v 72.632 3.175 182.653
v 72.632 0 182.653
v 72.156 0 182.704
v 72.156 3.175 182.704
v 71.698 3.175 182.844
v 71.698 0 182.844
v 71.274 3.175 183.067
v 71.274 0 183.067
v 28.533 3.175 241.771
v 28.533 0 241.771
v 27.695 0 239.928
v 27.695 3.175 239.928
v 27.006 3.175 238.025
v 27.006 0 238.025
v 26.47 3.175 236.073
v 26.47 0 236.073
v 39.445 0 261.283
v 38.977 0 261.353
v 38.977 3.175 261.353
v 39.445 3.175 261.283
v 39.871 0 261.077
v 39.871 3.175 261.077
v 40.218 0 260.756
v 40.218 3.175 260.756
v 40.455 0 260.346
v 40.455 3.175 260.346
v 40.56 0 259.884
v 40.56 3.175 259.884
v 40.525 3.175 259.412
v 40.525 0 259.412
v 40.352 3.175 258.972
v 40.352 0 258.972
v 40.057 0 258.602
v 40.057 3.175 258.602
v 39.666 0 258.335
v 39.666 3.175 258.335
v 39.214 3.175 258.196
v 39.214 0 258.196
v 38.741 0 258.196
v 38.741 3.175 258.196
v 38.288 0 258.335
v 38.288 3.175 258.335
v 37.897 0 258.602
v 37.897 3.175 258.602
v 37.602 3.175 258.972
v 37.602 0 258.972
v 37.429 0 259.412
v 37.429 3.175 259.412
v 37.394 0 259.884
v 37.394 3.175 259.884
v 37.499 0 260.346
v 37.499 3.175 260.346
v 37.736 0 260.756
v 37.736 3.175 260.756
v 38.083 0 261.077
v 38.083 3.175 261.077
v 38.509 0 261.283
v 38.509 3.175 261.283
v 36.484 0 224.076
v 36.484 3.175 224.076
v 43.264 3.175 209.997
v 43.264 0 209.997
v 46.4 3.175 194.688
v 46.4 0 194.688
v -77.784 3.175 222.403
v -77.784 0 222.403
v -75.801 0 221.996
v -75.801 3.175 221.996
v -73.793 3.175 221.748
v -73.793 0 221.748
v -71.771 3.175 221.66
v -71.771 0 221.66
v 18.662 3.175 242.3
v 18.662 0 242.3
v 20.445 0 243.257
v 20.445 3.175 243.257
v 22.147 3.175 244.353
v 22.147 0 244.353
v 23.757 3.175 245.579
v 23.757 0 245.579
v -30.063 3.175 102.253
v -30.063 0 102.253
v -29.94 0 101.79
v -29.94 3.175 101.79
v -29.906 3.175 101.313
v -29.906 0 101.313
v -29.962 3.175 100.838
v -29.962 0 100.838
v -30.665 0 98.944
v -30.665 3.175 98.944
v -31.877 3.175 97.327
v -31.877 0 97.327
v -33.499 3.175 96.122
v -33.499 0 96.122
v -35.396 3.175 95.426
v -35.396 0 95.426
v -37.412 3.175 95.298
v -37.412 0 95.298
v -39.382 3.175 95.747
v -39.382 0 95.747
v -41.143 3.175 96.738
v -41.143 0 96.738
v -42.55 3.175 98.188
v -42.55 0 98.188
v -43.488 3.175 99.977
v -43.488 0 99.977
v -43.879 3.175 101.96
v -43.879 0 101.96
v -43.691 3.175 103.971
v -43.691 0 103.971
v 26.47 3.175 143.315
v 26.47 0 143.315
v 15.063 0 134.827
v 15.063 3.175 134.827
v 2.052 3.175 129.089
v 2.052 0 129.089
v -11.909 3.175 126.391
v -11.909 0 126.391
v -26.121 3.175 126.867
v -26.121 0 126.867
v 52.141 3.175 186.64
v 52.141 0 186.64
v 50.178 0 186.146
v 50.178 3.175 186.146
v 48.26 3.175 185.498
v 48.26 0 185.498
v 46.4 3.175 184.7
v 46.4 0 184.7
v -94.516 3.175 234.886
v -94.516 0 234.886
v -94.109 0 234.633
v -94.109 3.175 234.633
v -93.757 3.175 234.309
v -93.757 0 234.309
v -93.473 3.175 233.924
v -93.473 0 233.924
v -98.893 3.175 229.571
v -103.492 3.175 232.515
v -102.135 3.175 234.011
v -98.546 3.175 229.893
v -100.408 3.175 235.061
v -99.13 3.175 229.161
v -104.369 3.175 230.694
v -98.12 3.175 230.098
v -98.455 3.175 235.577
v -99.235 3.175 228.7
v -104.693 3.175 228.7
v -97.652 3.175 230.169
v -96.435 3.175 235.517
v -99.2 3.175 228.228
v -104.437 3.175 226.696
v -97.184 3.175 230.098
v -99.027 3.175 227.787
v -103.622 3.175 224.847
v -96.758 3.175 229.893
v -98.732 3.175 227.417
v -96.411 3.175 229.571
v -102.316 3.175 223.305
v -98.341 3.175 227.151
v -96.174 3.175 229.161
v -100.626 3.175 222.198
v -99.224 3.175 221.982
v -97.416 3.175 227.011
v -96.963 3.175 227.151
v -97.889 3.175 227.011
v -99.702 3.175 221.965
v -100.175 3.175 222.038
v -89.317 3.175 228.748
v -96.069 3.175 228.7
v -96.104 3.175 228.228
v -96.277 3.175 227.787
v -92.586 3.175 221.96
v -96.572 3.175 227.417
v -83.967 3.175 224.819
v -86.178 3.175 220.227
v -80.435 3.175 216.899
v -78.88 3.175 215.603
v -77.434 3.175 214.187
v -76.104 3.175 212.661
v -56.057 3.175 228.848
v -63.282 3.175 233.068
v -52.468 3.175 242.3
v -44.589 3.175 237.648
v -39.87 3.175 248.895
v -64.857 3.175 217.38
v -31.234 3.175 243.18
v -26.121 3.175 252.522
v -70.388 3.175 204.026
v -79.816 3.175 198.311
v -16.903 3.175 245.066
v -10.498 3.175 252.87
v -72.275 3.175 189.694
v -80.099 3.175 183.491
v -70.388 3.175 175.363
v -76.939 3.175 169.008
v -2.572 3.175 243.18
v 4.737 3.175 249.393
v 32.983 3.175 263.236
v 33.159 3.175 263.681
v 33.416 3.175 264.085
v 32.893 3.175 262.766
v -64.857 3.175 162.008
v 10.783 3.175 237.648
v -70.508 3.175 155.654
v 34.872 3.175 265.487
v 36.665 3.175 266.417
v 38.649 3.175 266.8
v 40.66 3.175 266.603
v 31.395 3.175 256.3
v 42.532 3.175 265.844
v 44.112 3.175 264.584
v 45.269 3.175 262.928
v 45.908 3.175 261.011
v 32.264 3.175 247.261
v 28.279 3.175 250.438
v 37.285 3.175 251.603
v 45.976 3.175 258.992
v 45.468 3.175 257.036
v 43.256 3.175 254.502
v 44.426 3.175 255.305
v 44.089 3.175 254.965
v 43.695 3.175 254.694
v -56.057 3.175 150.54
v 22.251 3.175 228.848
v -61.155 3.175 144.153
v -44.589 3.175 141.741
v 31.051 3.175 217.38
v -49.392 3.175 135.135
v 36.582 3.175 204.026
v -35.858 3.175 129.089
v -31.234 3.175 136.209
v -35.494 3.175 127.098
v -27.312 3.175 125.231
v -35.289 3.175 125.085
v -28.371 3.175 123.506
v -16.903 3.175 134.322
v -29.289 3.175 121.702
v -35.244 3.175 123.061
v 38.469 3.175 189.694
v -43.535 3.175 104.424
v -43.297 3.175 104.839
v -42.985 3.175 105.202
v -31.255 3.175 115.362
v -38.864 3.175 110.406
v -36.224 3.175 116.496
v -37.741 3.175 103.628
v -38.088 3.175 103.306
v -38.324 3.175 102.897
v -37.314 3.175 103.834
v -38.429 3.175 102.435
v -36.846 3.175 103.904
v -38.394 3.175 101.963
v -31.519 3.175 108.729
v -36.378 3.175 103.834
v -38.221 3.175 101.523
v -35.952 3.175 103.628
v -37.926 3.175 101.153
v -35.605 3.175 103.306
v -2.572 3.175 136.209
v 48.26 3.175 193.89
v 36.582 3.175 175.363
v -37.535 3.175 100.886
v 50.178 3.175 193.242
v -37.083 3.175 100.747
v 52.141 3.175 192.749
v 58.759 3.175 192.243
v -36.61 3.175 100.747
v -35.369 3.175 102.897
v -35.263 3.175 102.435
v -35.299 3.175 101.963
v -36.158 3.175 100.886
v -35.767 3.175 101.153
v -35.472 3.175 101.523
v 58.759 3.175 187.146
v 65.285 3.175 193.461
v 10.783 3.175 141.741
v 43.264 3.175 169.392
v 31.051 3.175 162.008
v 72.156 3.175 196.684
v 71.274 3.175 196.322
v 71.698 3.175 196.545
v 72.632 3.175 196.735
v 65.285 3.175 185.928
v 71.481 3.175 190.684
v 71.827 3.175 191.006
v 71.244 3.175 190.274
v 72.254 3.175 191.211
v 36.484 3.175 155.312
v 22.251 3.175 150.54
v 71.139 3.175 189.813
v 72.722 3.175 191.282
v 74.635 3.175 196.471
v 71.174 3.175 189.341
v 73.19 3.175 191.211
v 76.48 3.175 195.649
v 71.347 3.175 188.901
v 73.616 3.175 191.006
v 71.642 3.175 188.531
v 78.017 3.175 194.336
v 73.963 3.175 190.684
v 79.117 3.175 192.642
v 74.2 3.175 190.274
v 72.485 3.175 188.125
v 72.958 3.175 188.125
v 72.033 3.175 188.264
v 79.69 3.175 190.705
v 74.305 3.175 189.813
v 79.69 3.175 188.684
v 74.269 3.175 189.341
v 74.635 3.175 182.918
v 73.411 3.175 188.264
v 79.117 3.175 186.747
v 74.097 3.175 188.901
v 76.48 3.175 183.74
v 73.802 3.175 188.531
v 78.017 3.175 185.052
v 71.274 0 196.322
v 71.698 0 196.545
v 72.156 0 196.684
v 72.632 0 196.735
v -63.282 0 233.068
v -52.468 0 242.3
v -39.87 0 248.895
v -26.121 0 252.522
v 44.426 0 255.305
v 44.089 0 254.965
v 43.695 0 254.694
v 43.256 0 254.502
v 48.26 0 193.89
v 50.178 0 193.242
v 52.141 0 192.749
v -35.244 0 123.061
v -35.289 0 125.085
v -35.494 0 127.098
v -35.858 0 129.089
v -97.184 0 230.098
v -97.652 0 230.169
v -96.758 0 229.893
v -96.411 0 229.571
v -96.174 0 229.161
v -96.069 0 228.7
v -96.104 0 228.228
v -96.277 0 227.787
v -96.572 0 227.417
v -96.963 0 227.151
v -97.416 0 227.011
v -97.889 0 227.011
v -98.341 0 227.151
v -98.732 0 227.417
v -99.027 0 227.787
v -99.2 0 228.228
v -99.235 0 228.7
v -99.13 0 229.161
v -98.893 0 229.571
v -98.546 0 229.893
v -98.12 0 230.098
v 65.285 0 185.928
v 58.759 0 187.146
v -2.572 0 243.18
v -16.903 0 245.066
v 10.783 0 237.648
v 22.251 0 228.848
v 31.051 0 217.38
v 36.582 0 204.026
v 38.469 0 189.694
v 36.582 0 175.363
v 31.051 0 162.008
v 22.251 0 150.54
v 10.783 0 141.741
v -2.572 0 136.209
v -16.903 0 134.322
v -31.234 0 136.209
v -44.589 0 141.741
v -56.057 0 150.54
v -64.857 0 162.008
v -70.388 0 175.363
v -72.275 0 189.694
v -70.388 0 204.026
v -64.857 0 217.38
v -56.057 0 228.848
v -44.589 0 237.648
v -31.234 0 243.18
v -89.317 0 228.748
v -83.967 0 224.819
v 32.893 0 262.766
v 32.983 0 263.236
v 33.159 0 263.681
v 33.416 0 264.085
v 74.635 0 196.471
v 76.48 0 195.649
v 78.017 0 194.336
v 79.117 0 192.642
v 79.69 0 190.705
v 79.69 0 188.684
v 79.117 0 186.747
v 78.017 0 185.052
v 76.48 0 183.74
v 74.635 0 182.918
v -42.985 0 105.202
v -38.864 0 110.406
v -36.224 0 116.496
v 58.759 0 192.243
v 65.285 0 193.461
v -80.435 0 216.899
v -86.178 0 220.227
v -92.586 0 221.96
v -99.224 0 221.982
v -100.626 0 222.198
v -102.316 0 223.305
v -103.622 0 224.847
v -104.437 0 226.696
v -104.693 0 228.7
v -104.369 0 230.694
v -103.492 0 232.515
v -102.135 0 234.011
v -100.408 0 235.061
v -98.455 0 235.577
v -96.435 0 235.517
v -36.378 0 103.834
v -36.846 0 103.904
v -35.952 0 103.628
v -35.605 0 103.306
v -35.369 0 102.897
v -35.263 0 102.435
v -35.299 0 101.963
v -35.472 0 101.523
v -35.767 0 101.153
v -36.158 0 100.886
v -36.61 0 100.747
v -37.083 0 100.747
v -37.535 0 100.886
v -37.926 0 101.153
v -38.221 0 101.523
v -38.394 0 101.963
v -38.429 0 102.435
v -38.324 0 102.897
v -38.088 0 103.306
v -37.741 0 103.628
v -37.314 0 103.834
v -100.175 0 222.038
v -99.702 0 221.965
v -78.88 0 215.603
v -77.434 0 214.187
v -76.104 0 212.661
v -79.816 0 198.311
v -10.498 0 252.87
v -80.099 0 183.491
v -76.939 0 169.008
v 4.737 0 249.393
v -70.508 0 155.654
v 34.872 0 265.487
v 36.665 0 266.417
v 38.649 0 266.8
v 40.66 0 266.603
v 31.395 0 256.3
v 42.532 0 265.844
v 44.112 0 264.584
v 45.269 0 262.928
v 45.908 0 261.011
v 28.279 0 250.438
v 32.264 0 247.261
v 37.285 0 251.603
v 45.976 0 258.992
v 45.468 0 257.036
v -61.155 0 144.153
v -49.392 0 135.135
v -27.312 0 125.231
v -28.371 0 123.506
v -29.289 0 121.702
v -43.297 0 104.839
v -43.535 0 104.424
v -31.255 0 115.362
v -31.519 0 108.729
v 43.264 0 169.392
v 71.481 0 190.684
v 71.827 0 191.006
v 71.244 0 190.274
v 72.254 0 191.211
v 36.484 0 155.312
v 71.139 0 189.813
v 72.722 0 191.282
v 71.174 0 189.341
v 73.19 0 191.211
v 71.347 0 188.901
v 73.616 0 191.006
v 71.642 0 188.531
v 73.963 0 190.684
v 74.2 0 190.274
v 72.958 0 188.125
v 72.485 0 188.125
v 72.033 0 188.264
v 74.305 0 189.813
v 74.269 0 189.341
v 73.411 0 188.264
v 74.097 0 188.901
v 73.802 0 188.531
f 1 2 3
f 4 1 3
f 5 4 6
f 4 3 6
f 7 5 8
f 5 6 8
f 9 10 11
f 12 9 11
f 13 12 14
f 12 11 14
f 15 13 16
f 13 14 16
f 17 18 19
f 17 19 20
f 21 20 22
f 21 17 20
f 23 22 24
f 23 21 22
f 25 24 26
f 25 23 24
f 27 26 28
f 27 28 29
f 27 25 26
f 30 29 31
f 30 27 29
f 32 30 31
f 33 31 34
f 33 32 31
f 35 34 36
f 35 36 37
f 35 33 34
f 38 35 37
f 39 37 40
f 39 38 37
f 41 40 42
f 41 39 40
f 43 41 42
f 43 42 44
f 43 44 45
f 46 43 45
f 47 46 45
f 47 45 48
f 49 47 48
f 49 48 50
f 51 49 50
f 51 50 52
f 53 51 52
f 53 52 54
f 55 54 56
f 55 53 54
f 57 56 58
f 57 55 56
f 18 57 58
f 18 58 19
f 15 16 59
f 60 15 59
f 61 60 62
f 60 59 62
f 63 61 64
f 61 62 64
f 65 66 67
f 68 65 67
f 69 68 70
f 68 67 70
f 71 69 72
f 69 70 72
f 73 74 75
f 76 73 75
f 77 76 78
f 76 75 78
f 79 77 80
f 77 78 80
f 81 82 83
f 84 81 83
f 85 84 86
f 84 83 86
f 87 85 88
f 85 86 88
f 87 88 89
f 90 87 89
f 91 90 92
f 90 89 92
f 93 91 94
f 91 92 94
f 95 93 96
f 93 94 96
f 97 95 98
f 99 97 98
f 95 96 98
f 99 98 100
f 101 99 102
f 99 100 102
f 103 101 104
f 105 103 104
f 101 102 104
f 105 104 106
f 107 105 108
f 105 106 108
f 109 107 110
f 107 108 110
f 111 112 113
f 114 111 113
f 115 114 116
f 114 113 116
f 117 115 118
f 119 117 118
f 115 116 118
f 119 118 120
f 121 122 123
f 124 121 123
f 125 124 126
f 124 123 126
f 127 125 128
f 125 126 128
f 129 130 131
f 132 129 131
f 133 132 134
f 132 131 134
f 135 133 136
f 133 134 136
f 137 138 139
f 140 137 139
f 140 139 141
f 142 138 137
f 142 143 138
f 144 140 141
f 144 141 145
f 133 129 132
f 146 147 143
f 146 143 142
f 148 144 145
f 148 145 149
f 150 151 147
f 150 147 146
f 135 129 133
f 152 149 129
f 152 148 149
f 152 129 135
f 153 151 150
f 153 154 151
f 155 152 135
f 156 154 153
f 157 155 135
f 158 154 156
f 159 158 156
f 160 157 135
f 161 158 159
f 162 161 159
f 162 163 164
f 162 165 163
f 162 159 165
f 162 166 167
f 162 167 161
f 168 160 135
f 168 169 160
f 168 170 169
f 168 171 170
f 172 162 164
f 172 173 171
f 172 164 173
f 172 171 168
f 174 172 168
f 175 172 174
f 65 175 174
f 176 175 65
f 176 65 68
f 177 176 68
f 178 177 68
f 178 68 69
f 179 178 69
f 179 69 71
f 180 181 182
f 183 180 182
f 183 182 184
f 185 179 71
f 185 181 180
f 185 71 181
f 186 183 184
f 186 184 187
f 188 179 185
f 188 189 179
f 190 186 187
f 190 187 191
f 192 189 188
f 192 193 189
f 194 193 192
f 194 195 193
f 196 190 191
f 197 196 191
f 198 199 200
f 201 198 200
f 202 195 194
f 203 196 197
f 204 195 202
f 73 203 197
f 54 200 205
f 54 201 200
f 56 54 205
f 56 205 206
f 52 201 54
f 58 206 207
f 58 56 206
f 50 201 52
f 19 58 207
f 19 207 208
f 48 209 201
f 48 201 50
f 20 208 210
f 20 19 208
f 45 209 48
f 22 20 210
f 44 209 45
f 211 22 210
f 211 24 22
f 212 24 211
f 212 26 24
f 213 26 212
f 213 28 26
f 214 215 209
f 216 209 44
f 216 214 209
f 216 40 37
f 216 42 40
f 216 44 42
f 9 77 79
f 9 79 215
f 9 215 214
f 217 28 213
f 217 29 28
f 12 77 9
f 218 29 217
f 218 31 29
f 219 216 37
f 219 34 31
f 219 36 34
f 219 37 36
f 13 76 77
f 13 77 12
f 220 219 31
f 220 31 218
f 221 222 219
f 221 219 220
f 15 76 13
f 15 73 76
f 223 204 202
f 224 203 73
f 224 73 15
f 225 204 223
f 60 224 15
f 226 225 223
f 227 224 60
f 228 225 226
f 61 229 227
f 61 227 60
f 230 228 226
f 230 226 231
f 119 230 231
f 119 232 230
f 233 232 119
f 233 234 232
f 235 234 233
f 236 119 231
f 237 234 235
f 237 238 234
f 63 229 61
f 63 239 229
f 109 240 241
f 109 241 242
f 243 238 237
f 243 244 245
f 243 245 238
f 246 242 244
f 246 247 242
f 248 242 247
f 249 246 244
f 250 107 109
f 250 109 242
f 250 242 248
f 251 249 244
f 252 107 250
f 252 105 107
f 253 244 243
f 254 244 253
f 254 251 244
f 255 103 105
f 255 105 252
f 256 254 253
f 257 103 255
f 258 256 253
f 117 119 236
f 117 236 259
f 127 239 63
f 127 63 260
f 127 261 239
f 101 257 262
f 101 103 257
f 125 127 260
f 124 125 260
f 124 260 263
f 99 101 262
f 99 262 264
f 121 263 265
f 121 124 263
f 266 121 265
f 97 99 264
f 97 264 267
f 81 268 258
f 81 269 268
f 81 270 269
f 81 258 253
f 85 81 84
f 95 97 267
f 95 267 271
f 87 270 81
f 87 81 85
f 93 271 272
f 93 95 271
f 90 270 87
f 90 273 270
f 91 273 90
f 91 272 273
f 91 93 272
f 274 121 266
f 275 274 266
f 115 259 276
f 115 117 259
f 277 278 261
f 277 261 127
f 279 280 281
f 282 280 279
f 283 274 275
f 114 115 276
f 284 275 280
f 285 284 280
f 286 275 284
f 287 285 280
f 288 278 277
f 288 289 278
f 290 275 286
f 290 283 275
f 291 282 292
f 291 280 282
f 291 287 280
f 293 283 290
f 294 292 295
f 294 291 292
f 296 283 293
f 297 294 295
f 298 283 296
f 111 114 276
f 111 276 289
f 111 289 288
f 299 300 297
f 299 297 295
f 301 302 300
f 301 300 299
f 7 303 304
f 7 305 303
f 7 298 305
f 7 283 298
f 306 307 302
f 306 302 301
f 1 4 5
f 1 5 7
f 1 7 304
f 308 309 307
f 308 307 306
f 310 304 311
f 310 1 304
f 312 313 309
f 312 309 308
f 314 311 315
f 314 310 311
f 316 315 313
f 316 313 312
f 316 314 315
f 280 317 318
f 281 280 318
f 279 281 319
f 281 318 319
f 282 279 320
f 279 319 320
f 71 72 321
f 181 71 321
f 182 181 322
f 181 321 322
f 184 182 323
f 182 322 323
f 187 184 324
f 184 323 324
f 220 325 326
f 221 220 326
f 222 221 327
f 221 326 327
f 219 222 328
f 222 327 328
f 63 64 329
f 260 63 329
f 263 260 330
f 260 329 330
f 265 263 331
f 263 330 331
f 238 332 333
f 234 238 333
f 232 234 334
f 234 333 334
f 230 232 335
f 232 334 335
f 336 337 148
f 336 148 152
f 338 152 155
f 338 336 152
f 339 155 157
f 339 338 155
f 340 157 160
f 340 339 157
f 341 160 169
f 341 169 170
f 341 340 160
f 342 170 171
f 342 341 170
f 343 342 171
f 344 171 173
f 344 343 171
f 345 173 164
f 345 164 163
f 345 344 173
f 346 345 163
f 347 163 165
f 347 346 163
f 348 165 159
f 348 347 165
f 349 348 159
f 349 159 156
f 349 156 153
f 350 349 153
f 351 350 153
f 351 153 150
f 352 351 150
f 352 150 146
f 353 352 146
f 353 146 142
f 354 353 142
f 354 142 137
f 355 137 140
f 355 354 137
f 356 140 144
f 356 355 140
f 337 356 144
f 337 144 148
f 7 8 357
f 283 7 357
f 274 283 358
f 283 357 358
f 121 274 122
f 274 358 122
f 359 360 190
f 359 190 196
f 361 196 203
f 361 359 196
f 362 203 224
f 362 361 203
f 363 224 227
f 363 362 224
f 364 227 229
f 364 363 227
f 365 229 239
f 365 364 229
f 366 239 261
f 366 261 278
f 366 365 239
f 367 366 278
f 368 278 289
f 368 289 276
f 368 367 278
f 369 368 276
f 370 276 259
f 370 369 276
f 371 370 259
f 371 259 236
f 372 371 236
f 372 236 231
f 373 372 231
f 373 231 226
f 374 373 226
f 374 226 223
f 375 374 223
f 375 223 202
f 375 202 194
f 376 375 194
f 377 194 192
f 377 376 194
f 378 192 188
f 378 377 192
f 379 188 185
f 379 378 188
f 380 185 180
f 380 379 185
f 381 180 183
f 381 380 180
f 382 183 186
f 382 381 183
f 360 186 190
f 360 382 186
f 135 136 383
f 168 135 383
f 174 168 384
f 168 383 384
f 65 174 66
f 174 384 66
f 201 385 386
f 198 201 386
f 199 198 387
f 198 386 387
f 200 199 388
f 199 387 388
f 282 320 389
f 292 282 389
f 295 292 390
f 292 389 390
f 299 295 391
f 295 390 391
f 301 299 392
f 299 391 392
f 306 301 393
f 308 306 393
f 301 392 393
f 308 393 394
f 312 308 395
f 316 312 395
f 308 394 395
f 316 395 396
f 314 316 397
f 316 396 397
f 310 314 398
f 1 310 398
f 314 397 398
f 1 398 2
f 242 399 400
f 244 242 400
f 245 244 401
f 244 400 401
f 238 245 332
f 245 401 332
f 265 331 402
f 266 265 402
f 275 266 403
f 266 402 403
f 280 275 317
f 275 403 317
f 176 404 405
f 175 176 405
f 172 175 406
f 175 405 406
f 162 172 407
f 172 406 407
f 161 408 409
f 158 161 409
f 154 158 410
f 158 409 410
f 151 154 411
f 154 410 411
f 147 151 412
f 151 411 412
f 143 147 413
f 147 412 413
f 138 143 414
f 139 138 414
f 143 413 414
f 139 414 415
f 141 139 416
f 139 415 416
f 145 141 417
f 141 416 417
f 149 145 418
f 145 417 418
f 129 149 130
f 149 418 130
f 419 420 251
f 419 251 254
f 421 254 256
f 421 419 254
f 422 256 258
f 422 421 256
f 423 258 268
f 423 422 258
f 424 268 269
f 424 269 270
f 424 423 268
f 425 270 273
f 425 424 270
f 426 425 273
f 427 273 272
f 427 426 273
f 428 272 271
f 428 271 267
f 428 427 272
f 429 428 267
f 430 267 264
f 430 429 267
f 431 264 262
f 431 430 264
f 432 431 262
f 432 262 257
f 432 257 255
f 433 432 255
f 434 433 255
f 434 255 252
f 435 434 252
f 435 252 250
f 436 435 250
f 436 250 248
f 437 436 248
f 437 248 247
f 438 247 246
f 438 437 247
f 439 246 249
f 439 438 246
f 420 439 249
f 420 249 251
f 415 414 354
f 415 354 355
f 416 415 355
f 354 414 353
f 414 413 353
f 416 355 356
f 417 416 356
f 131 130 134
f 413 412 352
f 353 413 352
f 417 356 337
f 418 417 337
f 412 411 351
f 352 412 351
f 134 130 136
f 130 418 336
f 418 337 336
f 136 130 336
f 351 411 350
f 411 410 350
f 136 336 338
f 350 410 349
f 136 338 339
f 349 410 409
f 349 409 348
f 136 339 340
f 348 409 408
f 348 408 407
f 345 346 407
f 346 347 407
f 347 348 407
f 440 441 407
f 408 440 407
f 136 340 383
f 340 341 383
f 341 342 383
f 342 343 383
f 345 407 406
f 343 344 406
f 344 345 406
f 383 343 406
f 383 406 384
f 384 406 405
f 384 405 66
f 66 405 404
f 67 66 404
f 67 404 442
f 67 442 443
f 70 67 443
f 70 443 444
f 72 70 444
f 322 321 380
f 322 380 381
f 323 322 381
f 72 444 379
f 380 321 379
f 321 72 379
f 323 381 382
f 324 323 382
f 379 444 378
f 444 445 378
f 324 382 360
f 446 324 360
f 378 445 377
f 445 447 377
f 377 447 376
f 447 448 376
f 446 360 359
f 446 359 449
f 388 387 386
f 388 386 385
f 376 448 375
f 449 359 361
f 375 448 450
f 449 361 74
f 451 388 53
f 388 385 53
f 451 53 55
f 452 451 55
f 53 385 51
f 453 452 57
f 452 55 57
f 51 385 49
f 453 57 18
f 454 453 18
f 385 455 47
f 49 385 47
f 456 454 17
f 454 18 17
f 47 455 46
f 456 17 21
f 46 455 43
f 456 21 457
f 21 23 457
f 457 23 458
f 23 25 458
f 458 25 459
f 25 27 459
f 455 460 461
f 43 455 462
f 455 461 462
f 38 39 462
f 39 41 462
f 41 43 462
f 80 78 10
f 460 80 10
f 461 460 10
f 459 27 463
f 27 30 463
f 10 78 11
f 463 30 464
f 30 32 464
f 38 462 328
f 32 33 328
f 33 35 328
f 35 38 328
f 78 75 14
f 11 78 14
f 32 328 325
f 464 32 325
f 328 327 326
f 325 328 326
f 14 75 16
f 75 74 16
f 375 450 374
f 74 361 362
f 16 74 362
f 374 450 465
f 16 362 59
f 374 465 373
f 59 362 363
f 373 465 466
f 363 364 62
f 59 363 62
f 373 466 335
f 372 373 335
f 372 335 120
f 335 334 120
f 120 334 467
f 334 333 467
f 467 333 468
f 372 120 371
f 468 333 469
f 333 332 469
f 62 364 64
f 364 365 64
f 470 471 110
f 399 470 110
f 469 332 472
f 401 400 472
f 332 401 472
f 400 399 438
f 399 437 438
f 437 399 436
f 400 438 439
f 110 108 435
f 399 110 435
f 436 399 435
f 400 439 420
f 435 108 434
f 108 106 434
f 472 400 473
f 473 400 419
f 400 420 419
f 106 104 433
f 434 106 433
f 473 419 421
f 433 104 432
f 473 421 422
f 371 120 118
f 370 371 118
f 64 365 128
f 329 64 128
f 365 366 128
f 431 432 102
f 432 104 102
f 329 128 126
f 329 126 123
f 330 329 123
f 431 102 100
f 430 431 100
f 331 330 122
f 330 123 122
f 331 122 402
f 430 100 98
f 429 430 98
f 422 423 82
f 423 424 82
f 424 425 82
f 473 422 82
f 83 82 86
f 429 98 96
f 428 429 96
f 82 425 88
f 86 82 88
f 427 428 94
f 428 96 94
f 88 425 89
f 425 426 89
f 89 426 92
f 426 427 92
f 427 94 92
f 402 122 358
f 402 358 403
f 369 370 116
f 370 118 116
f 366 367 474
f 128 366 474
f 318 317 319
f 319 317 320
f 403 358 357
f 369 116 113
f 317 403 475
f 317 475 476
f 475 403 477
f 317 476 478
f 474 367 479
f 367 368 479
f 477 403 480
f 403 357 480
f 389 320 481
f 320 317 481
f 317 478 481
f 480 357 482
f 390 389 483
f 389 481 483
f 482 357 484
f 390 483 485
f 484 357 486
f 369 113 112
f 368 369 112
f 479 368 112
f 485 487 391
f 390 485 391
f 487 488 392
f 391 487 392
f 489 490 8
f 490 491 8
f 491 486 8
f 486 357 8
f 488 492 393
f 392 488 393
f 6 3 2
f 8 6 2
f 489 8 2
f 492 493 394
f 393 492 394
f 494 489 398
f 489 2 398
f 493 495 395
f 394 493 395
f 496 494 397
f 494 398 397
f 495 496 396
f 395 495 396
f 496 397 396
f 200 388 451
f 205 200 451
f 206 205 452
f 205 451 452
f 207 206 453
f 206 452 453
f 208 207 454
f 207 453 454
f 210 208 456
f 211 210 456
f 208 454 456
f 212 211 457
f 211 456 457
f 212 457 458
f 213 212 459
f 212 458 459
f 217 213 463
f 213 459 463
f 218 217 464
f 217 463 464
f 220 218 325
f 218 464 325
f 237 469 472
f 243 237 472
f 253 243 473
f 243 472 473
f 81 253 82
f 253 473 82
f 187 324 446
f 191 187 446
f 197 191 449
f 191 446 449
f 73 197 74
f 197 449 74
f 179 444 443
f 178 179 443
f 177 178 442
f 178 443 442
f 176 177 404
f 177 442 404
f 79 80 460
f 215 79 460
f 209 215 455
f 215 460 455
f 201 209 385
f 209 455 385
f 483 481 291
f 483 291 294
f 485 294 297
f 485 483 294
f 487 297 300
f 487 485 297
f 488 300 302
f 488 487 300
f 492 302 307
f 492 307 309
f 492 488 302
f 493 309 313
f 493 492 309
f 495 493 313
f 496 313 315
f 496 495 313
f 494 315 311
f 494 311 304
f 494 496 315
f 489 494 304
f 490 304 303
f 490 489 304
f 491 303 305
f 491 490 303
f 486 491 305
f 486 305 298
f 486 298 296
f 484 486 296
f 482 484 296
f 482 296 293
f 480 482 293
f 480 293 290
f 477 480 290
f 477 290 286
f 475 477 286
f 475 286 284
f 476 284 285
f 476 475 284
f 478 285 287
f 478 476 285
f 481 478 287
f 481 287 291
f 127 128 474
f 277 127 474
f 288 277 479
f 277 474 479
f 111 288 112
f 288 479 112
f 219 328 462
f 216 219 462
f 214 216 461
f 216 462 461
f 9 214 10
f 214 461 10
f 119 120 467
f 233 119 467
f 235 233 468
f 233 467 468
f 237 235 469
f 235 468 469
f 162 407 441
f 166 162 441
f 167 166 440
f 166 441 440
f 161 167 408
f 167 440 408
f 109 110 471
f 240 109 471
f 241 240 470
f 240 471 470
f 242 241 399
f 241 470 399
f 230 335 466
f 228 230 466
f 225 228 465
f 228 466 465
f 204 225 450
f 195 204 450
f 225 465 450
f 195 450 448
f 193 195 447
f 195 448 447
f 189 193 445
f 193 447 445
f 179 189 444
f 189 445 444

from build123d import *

# Parameters (mm, degrees)
SKETCH35_R          = 1.5875
SKETCH35_R_2        = 55.372
BOSS_EXTRUDE5_DEPTH = 3.175


with BuildPart() as part:
    # Sketch35 → Boss-Extrude5 (new body)
    with BuildSketch(Plane(origin=(0, 0, 0), x_dir=(1, 0, 0), z_dir=(0, 1, 0))):
        with BuildLine():
            ThreePointArc((72.63160158, -196.735304264), (79.763343901, -189.694281524), (72.63160158, -182.653258784))
            ThreePointArc((72.63160158, -182.653258784), (71.923524594, -182.763416409), (71.274394231, -183.066957991))
            ThreePointArc((71.274394231, -183.066957991), (62.061766366, -186.749902585), (52.140854077, -186.639937081))
            ThreePointArc((52.140854077, -186.639937081), (49.212807322, -185.841233605), (46.400330688, -184.700461837))
            ThreePointArc((46.400330688, -184.700461837), (40.308522411, -162.14266409), (26.470306292, -143.315339746))
            ThreePointArc((26.470306292, -143.315339746), (2.051929923, -129.089326239), (-26.120702924, -126.866867398))
            ThreePointArc((-26.120702924, -126.866867398), (-27.858708089, -124.378751024), (-29.2889381, -121.701844758))
            ThreePointArc((-29.2889381, -121.701844758), (-31.603757208, -112.05414008), (-30.063154281, -102.252959759))
            ThreePointArc((-30.063154281, -102.252959759), (-29.911668214, -101.552560093), (-29.961834423, -100.837723697))
            ThreePointArc((-29.961834423, -100.837723697), (-38.413285984, -95.451564003), (-43.690813622, -103.971273609))
            ThreePointArc((-43.690813622, -103.971273609), (-43.425855926, -104.63708525), (-42.98547967, -105.202396203))
            ThreePointArc((-42.98547967, -105.202396203), (-37.34487163, -113.364511982), (-35.244469401, -123.061155914))
            ThreePointArc((-35.244469401, -123.061155914), (-35.371596014, -126.093518667), (-35.857931325, -129.089326239))
            ThreePointArc((-35.857931325, -129.089326239), (-74.114523813, -162.14266409), (-76.104068675, -212.661291576))
            ThreePointArc((-76.104068675, -212.661291576), (-78.143060244, -214.909379303), (-80.434594764, -216.899418143))
            ThreePointArc((-80.434594764, -216.899418143), (-89.325315633, -221.303016159), (-99.223576302, -221.982007162))
            ThreePointArc((-99.223576302, -221.982007162), (-99.940124308, -221.990172755), (-100.625875231, -222.198147255))
            ThreePointArc((-100.625875231, -222.198147255), (-103.996367762, -231.636236566), (-94.515904683, -234.885631829))
            ThreePointArc((-94.515904683, -234.885631829), (-93.925744965, -234.479160148), (-93.472600473, -233.924031523))
            ThreePointArc((-93.472600473, -233.924031523), (-86.770279347, -226.608603676), (-77.784133989, -222.403156653))
            ThreePointArc((-77.784133989, -222.403156653), (-74.799510568, -221.852331744), (-71.770594359, -221.659843715))
            ThreePointArc((-71.770594359, -221.659843715), (-52.467656797, -242.300414596), (-26.120702924, -252.52169565))
            ThreePointArc((-26.120702924, -252.52169565), (-2.772921395, -251.602203947), (18.661655395, -242.300414596))
            ThreePointArc((18.661655395, -242.300414596), (21.307097177, -243.788037808), (23.75715599, -245.579293472))
            ThreePointArc((23.75715599, -245.579293472), (30.028718121, -253.267212663), (32.893255611, -262.766213559))
            ThreePointArc((32.893255611, -262.766213559), (33.060663407, -263.462979195), (33.416017488, -264.085258231))
            ThreePointArc((33.416017488, -264.085258231), (43.367479341, -265.271073029), (44.425803982, -255.305246485))
            ThreePointArc((44.425803982, -255.305246485), (43.898200503, -254.82033176), (43.256155975, -254.502076287))
            ThreePointArc((43.256155975, -254.502076287), (34.632734421, -249.595632182), (28.533121278, -241.770588249))
            ThreePointArc((28.533121278, -241.770588249), (27.331965509, -238.983365642), (26.470306292, -236.073223302))
            ThreePointArc((26.470306292, -236.073223302), (40.308522411, -217.245898958), (46.400330688, -194.68810121))
            ThreePointArc((46.400330688, -194.68810121), (49.212807322, -193.547329442), (52.140854077, -192.748625967))
            ThreePointArc((52.140854077, -192.748625967), (62.061766366, -192.638660462), (71.274394231, -196.321605056))
            ThreePointArc((71.274394231, -196.321605056), (71.923524594, -196.625146639), (72.63160158, -196.735304264))
        make_face()
        with Locations(Location((72.72174416, -189.694281524, 0), (0, 0, 270))):
            Circle(SKETCH35_R, mode=Mode.SUBTRACT)
        with Locations(Location((-16.903000701, -189.694281524, 0), (0, 0, 270))):
            Circle(SKETCH35_R_2, mode=Mode.SUBTRACT)
        with Locations(Location((-97.652105615, -228.581000942, 0), (0, 0, 270))):
            Circle(SKETCH35_R, mode=Mode.SUBTRACT)
        with Locations(Location((-36.846382633, -102.316616136, 0), (0, 0, 270))):
            Circle(SKETCH35_R, mode=Mode.SUBTRACT)
        with Locations(Location((38.977113714, -259.765728664, 0), (0, 0, 270))):
            Circle(SKETCH35_R, mode=Mode.SUBTRACT)
    extrude(amount=BOSS_EXTRUDE5_DEPTH)


solid = part.part
